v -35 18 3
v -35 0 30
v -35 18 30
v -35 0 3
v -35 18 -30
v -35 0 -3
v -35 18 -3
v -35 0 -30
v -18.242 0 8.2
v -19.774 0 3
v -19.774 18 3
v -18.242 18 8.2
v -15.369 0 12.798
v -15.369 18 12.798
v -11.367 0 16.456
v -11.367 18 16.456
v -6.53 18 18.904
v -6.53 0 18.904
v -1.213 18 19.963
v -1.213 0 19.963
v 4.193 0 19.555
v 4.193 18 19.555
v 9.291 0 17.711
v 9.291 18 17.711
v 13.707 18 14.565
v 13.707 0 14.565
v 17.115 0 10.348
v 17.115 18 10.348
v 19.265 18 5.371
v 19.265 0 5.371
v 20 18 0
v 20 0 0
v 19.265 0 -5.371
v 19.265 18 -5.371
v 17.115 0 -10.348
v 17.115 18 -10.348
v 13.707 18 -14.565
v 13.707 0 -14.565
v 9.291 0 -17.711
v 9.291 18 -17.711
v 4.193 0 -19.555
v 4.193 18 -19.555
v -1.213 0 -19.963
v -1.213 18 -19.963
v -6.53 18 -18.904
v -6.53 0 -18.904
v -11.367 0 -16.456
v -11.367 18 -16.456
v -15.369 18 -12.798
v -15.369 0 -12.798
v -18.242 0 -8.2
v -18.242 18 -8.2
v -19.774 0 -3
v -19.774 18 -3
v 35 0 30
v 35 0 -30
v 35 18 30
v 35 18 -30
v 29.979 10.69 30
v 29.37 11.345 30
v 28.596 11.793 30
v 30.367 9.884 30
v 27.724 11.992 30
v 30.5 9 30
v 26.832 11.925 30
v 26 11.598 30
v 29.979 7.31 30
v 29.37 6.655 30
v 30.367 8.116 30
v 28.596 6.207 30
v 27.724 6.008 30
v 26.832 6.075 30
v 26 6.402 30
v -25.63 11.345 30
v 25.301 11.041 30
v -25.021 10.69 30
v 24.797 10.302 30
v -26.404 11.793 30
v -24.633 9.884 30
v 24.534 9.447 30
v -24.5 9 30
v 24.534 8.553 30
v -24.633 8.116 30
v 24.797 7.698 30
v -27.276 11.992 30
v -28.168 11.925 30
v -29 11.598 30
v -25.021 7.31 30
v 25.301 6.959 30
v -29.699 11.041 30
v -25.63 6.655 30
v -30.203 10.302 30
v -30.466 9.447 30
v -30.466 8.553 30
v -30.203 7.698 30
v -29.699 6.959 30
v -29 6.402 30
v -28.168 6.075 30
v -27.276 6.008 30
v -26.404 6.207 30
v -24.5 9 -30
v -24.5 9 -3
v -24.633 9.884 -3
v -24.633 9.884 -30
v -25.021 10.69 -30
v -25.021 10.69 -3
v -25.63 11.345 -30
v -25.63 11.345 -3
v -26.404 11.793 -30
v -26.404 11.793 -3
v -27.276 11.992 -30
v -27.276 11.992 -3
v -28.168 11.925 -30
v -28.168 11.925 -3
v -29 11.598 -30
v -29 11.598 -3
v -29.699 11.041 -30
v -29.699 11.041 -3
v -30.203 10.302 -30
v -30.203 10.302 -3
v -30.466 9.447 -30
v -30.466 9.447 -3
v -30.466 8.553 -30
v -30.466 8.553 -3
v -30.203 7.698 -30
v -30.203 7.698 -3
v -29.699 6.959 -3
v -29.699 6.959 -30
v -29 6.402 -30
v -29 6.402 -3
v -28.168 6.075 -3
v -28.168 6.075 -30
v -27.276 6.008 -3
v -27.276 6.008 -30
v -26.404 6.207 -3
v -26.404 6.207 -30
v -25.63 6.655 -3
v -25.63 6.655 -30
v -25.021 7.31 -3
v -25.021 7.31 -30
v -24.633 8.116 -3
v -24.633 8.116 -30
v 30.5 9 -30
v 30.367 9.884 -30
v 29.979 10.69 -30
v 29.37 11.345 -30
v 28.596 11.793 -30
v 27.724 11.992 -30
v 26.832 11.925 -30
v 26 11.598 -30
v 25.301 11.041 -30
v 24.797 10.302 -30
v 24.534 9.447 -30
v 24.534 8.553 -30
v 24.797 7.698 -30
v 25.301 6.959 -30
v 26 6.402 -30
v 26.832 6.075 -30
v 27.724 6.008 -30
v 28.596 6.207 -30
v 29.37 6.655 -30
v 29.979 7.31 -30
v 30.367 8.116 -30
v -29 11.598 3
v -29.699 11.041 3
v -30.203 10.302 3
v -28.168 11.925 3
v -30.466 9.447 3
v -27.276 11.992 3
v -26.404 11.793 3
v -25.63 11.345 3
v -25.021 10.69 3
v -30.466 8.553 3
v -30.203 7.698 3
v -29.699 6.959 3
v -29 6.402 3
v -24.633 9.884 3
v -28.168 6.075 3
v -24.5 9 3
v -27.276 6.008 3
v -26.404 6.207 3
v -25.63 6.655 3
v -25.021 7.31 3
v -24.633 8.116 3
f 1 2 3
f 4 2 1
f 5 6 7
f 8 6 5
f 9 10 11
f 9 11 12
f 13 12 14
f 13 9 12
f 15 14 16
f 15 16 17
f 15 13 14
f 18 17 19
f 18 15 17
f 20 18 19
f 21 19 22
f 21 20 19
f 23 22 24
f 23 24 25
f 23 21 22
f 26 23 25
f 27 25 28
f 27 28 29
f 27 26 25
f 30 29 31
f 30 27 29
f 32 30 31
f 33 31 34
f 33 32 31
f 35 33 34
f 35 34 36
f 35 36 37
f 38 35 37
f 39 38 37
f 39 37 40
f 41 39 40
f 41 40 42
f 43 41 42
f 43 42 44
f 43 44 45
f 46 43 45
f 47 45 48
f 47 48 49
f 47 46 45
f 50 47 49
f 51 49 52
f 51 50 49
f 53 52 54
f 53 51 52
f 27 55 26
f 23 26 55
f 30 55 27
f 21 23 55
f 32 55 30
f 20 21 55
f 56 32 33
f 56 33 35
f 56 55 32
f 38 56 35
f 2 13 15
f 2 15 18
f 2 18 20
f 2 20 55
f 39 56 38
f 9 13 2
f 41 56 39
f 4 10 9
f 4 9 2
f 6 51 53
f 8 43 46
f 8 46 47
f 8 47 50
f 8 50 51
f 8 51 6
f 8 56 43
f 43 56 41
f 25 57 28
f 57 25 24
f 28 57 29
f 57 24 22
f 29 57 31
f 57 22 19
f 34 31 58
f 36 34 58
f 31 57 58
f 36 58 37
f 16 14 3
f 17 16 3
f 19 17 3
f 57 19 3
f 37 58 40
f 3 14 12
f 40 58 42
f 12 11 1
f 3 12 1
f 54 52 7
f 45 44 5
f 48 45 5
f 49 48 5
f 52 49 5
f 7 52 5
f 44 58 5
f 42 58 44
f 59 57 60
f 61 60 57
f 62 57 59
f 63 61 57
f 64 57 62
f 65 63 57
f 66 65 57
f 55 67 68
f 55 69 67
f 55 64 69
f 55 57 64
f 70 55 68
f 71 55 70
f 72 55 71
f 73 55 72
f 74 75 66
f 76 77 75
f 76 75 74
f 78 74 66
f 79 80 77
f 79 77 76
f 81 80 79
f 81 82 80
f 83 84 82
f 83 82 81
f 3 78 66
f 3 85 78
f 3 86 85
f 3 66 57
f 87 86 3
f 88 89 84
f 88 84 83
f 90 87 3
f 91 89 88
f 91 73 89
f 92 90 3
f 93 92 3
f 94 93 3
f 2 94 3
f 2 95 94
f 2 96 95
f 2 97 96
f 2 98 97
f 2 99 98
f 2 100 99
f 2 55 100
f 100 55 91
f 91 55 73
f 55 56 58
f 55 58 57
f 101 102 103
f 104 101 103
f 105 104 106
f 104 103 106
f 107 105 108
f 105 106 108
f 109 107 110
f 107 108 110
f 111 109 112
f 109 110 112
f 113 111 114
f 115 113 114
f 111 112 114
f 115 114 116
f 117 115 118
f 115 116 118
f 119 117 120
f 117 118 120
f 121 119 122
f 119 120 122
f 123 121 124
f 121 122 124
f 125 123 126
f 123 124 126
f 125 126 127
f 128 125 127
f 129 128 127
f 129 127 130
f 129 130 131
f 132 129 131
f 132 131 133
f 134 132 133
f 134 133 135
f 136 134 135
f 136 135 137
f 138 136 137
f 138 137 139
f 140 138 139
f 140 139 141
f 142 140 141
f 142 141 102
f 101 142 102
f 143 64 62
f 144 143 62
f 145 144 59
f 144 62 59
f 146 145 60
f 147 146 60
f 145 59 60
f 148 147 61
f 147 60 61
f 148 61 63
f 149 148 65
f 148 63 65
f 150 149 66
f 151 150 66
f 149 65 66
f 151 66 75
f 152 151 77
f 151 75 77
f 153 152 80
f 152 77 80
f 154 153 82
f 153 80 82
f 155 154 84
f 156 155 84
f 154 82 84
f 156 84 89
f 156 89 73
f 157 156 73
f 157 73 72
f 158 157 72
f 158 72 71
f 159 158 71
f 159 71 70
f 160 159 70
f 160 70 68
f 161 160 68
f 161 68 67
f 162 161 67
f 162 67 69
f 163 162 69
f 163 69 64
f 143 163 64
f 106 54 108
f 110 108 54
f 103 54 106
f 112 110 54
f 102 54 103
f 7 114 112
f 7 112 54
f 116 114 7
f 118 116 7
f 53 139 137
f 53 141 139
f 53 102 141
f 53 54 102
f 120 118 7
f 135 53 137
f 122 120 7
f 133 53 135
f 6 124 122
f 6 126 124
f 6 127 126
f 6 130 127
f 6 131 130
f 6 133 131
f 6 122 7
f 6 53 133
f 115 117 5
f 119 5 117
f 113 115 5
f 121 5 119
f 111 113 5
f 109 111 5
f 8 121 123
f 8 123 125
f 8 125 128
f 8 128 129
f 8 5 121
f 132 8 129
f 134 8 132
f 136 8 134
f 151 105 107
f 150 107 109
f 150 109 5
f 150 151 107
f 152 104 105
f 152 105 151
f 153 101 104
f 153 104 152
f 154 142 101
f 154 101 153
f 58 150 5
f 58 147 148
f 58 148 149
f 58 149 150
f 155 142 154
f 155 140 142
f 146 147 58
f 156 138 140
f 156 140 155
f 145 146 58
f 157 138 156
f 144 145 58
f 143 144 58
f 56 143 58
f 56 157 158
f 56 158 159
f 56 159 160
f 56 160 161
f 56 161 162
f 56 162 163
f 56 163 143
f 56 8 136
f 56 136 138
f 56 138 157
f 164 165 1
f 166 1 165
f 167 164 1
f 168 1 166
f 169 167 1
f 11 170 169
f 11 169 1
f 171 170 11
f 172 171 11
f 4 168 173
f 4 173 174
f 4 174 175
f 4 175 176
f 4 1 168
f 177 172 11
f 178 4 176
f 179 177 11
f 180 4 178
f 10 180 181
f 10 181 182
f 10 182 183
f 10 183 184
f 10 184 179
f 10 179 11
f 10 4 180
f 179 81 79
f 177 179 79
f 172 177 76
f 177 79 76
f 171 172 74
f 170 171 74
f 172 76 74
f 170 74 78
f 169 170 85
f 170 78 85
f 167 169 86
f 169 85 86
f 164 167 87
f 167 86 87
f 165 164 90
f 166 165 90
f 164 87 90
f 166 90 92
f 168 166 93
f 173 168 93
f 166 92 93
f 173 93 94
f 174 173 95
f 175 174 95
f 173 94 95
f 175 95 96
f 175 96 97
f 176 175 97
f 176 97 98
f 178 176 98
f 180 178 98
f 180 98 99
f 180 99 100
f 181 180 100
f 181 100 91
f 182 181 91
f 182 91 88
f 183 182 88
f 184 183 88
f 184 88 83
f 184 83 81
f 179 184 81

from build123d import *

# Parameters (mm, degrees)
BOSS_EXTRUDE1_DEPTH = 18
SKETCH2_R           = 3
CUT_EXTRUDE1_DEPTH  = 61


with BuildPart() as part:
    # Sketch1 → Boss-Extrude1 (new body)
    with BuildSketch(Plane(origin=(0, 0, 0), x_dir=(1, 0, 0), z_dir=(0, 1, 0))):
        with BuildLine():
            Line((-35, 30), (35, 30))
            Line((35, 30), (35, -30))
            Line((35, -30), (-35, -30))
            Line((-35, -30), (-35, -3))
            Line((-35, -3), (-19.773719933, -3))
            ThreePointArc((-19.773719933, -3), (20, 0), (-19.773719933, 3))
            Line((-19.773719933, 3), (-35, 3))
            Line((-35, 3), (-35, 30))
        make_face()
    extrude(amount=BOSS_EXTRUDE1_DEPTH)

    # Sketch2 → Cut-Extrude1 (cut, through all)
    with BuildSketch(Plane.XY.offset(30)):
        with Locations((27.5, 9)):
            Circle(SKETCH2_R)
        with Locations((-27.5, 9)):
            Circle(SKETCH2_R)
    extrude(amount=-CUT_EXTRUDE1_DEPTH, mode=Mode.SUBTRACT)


solid = part.part
